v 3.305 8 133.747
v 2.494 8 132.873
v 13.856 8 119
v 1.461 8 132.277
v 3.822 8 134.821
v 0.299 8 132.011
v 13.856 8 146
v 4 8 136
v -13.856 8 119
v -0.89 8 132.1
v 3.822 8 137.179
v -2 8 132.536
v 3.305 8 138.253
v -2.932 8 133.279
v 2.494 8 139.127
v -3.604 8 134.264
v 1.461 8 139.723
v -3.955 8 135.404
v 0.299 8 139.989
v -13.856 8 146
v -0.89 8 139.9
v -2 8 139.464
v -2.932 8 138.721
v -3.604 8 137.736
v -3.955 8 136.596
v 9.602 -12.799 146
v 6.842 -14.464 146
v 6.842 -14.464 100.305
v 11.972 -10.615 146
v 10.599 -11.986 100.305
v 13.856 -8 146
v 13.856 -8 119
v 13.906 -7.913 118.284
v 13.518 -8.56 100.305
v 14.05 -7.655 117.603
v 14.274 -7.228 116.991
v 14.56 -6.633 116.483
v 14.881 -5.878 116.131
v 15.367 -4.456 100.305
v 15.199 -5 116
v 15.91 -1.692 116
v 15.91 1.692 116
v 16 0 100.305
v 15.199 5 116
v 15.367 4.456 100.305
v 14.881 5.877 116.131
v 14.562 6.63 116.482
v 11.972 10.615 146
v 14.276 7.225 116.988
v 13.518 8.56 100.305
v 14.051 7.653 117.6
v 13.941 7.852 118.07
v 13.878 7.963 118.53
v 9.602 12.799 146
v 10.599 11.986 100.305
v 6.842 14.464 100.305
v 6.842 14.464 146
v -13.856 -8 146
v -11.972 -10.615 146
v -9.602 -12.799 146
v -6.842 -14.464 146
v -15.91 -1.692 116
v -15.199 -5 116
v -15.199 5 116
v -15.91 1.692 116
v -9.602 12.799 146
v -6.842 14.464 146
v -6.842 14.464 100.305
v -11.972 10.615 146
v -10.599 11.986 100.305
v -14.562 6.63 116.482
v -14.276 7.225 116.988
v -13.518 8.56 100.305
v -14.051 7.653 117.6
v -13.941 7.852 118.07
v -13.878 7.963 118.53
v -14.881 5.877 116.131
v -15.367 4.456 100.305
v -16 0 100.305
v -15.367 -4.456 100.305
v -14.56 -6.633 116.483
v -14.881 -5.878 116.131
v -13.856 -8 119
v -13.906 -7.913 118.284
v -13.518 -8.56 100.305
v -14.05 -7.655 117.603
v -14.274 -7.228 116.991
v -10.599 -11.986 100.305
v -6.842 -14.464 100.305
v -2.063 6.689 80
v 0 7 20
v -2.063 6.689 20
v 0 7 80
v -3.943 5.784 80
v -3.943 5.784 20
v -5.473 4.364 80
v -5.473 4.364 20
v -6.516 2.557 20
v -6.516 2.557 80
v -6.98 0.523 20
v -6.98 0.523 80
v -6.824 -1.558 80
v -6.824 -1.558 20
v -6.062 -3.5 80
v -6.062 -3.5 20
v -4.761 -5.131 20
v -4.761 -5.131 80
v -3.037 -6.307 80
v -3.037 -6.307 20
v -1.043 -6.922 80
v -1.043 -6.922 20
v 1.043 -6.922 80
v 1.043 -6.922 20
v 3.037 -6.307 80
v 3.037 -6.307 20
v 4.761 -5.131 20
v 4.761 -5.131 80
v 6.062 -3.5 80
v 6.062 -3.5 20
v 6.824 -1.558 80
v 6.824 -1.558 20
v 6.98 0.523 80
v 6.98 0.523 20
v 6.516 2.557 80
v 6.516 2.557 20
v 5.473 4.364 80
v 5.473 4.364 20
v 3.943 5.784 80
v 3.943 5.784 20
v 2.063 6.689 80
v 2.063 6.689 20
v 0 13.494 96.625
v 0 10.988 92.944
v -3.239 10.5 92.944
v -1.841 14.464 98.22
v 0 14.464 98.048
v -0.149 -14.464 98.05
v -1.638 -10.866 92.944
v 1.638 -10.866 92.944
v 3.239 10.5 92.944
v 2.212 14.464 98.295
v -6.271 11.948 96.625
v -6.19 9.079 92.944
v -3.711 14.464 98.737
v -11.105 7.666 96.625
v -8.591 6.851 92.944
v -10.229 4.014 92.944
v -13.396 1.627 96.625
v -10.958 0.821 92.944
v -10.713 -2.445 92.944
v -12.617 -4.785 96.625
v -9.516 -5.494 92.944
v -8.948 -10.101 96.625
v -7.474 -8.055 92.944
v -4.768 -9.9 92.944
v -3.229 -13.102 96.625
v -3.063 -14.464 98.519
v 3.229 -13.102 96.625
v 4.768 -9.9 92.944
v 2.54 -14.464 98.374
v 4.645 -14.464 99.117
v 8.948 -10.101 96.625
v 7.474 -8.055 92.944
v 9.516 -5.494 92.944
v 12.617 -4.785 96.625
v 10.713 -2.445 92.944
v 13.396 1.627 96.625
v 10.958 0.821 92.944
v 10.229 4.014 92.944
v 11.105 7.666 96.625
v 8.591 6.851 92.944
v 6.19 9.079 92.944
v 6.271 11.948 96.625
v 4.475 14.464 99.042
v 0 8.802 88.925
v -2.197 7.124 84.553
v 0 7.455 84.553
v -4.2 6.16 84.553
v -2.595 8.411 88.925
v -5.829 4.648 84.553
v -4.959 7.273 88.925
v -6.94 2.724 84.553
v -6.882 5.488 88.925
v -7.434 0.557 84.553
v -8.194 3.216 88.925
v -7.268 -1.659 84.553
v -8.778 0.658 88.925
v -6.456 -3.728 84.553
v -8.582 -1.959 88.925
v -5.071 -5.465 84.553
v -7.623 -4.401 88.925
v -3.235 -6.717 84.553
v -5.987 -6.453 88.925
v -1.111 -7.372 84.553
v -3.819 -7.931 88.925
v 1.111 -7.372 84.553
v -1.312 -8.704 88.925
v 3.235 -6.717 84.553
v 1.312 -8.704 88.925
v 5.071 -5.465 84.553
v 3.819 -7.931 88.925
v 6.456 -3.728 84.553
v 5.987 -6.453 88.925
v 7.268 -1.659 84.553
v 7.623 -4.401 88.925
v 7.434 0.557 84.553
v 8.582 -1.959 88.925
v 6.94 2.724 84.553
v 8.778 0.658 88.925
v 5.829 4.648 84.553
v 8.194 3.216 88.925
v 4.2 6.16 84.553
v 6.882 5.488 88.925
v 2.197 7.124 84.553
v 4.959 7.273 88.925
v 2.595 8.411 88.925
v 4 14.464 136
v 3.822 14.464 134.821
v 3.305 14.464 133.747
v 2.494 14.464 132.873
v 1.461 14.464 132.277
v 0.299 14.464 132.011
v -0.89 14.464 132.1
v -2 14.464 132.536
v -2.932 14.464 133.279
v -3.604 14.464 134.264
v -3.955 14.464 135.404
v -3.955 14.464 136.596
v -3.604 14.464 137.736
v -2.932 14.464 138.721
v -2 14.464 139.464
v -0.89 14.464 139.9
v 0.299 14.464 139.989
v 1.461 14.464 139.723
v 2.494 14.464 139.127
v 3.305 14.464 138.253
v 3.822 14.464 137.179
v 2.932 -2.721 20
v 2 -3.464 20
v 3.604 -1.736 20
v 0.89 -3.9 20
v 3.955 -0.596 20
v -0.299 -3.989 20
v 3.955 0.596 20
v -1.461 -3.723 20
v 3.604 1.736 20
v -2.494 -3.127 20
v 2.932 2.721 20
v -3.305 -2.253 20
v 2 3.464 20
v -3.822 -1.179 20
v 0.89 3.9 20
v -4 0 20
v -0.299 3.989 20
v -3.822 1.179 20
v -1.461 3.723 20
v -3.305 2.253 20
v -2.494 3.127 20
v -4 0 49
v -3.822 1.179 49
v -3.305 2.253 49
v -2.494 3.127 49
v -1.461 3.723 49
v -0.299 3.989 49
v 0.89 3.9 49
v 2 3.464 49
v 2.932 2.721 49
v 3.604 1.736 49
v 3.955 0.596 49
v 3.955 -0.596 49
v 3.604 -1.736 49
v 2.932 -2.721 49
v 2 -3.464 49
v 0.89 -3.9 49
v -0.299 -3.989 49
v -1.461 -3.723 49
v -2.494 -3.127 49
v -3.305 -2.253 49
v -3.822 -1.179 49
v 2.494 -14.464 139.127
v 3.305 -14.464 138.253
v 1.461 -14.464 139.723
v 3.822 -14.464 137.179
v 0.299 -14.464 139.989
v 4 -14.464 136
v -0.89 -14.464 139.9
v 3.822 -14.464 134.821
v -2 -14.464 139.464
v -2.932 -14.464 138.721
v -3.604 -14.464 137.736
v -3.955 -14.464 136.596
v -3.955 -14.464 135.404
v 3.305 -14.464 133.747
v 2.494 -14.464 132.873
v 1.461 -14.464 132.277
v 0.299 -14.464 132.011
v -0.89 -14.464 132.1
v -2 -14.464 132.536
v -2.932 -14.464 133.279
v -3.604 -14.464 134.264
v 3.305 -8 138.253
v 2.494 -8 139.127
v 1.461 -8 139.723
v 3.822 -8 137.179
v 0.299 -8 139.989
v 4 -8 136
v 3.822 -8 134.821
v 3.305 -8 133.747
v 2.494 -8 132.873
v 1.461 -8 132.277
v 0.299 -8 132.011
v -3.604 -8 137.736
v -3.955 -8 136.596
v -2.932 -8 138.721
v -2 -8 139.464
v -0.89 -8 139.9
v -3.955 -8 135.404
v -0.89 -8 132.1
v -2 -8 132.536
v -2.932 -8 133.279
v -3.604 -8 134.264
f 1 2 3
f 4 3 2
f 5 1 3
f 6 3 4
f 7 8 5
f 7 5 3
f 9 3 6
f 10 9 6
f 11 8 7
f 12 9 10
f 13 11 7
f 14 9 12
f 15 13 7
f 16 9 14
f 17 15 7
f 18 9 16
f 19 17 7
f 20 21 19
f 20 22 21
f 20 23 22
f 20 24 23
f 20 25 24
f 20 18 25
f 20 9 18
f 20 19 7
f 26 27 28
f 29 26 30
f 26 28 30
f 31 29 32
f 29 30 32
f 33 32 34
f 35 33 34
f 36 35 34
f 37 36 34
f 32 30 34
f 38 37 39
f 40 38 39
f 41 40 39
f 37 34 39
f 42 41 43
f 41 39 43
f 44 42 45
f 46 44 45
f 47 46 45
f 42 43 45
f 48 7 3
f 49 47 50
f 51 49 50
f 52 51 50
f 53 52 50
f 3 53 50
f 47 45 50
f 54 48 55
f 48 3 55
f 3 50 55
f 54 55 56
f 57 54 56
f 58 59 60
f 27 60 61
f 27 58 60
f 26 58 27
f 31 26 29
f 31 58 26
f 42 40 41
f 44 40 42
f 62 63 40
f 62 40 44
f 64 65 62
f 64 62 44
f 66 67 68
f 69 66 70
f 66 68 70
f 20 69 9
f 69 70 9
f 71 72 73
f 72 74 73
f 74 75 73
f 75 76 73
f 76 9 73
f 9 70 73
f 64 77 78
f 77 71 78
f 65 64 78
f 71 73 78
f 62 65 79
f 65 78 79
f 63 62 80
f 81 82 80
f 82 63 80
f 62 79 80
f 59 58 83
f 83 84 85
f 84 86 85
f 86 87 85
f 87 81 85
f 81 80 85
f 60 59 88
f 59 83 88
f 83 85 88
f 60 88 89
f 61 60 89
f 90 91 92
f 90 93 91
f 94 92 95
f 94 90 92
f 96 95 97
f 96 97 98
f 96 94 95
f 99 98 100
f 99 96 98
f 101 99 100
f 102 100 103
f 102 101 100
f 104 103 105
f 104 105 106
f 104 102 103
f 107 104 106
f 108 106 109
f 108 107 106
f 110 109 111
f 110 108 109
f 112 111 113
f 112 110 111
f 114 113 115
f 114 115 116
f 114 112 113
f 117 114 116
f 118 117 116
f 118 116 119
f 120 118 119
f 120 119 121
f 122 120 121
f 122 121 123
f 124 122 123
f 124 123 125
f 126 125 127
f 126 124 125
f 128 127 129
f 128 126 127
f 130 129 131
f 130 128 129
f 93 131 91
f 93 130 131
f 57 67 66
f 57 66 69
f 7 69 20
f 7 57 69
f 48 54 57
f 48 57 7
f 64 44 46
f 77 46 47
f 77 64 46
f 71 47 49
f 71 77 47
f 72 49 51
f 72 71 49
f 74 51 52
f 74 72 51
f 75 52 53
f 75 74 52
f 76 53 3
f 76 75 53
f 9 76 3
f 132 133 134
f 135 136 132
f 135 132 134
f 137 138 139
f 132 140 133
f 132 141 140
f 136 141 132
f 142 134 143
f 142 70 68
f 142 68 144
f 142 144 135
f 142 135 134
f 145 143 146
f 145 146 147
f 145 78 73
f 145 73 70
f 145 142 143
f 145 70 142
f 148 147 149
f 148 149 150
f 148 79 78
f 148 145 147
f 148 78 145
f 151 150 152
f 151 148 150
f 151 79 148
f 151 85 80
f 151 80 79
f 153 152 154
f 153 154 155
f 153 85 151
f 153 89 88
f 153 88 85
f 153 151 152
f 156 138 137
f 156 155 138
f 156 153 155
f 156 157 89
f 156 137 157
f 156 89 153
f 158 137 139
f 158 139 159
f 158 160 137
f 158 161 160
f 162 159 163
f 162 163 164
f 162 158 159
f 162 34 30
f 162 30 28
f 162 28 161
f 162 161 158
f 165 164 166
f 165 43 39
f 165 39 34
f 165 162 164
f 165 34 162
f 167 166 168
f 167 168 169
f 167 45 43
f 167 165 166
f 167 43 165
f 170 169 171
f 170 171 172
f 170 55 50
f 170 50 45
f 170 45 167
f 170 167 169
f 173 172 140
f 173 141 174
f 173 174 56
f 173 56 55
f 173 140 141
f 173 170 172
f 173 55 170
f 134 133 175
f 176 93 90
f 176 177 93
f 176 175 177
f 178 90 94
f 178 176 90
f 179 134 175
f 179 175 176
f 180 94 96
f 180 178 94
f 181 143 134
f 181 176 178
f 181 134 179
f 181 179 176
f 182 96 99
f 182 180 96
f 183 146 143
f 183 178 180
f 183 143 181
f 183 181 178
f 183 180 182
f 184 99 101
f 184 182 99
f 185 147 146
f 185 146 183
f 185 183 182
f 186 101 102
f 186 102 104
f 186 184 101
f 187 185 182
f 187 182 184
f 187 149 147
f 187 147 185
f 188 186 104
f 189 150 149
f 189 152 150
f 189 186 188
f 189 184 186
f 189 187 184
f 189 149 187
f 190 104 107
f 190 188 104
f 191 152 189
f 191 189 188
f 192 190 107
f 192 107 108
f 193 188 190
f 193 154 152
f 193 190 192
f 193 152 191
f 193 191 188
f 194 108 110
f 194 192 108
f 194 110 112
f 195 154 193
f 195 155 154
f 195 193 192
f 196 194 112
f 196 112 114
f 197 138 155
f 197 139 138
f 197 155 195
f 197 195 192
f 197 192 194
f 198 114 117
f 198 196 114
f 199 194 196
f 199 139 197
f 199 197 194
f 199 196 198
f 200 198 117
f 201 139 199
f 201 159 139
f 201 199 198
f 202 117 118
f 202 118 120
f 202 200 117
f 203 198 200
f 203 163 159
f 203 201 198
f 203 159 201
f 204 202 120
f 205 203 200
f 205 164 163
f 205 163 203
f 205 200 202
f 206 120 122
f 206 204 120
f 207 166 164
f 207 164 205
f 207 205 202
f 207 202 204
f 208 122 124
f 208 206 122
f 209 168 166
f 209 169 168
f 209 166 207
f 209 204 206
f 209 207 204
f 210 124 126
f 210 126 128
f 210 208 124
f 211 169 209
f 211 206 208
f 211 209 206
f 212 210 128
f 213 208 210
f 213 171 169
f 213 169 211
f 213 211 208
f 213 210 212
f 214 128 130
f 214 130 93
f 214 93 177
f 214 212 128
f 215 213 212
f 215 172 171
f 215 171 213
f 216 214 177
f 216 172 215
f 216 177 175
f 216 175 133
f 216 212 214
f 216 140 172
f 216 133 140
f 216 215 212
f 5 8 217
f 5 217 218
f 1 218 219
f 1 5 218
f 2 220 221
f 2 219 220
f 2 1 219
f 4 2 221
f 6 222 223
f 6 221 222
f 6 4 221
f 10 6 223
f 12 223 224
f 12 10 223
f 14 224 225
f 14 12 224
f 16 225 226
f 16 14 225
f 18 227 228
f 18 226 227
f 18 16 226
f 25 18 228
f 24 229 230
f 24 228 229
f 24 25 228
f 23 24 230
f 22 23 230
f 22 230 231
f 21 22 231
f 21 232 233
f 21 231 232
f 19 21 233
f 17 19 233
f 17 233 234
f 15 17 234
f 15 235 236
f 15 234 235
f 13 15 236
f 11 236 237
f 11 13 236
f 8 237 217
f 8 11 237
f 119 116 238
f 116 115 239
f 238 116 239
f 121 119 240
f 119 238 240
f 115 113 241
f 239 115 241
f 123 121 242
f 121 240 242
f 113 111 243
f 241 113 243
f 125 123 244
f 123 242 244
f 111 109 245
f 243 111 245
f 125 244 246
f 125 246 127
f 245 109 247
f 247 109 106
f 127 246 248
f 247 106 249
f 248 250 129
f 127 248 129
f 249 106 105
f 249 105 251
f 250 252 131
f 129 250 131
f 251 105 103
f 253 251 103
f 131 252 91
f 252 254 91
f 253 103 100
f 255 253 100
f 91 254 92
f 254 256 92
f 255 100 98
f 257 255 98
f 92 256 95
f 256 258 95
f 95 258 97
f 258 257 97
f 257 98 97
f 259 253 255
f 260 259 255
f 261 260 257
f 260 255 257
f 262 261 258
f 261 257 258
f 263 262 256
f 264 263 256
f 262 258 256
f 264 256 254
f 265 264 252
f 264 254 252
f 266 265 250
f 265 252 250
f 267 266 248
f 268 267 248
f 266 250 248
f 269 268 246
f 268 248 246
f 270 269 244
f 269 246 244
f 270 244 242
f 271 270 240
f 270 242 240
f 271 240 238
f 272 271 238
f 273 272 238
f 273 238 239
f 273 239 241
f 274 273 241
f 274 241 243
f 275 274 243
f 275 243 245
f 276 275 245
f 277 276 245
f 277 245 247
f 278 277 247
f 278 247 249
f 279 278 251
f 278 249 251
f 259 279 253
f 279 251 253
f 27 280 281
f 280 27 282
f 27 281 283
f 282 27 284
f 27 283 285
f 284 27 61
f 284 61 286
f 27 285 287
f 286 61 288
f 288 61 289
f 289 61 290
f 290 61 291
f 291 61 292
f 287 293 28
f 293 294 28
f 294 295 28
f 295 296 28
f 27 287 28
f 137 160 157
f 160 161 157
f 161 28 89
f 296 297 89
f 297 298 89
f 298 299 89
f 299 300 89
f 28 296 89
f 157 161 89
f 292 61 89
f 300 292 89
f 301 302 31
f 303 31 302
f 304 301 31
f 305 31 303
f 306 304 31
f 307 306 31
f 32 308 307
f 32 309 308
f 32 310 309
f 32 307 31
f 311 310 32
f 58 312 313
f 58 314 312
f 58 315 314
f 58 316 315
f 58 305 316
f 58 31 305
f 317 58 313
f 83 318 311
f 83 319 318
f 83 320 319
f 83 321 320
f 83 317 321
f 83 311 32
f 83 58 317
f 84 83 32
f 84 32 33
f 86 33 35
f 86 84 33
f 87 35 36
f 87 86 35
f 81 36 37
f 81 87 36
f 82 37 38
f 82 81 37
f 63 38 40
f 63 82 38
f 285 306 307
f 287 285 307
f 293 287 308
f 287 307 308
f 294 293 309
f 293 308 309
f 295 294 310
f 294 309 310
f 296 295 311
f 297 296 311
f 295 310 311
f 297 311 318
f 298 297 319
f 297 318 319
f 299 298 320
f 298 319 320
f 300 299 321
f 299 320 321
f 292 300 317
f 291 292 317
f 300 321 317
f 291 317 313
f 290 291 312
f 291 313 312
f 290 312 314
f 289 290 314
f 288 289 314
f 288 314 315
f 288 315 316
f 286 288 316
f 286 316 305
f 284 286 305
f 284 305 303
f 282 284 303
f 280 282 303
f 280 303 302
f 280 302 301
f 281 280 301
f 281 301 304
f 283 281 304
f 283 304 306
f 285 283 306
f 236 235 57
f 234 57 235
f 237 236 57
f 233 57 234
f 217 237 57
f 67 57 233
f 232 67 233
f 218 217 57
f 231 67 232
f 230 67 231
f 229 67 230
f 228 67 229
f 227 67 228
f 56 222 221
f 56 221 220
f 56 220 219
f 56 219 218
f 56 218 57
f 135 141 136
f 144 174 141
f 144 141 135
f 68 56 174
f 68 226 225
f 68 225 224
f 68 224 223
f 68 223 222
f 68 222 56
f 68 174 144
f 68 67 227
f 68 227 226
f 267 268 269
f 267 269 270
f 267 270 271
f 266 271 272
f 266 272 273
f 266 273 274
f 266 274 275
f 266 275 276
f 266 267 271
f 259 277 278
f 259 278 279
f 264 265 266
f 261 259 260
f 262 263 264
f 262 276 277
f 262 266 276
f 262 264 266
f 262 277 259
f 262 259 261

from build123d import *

# Parameters (mm, degrees)
SKETCH1_R               = 16
BOSS_EXTRUDE1_DEPTH     = 146
SKETCH2_W               = 150.836885197
SKETCH2_H               = 19.135619971
CUT_EXTRUDE2_DEPTH      = 17
CUT_EXTRUDE2_DEPTH_BACK = 17
SKETCH3_R               = 4
CUT_EXTRUDE3_DEPTH      = 15.463502114
CUT_EXTRUDE3_DEPTH_BACK = 15.463502114
SKETCH5_W               = 20
SKETCH5_H               = 24.196648242
CUT_EXTRUDE4_DEPTH      = 17.0000001
CUT_EXTRUDE4_DEPTH_BACK = 17.0000001
SKETCH6_R               = 4
CUT_EXTRUDE5_DEPTH      = 29


with BuildPart() as part:
    # Sketch1 → Boss-Extrude1 (new body)
    with BuildSketch(Plane.XY):
        Circle(SKETCH1_R)
    extrude(amount=BOSS_EXTRUDE1_DEPTH)

    # Sketch2 → Cut-Extrude2 (cut, two sides)
    with BuildSketch(Plane(origin=(0, 0, 0), x_dir=(0, 0, -1), z_dir=(1, 0, 0))) as cut_extrude2_sk:
        with BuildLine():
            Line((-116, -5), (-116, 5))
            ThreePointArc((-116, 5), (-116.878679656, 7.121320344), (-119, 8))
            Line((-119, 8), (-146, 8))
            Line((-146, 8), (-146, -8))
            Line((-146, -8), (-119, -8))
            ThreePointArc((-119, -8), (-116.878679656, -7.121320344), (-116, -5))
        make_face()
        with Locations((-70.581557402, -24.031312)):
            Rectangle(SKETCH2_W, SKETCH2_H)
        with Locations((-70.581557402, 24.031312)):
            Rectangle(SKETCH2_W, SKETCH2_H)
    extrude(amount=CUT_EXTRUDE2_DEPTH, mode=Mode.SUBTRACT)
    extrude(cut_extrude2_sk.sketch, amount=-CUT_EXTRUDE2_DEPTH_BACK, mode=Mode.SUBTRACT)

    # Sketch3 → Cut-Extrude3 (cut, two sides)
    with BuildSketch(Plane(origin=(0, 0, 0), x_dir=(1, 0, 0), z_dir=(0, 1, 0))) as cut_extrude3_sk:
        with Locations((0, -136)):
            Circle(SKETCH3_R)
    extrude(amount=CUT_EXTRUDE3_DEPTH, mode=Mode.SUBTRACT)
    extrude(cut_extrude3_sk.sketch, amount=-CUT_EXTRUDE3_DEPTH_BACK, mode=Mode.SUBTRACT)

    # Sketch4 → Cut-Revolve3 (revolve, cut)
    with BuildSketch(Plane(origin=(0, 0, 0), x_dir=(0, 0, -1), z_dir=(1, 0, 0))):
        with BuildLine():
            Line((0, 7), (-80, 7))
            ThreePointArc((-80, 7), (-86.772424654, 8.019684618), (-92.944350416, 10.988324842))
            Line((-92.944350416, 10.988324842), (-118.219798108, 28.197447612))
            Line((-118.219798108, 28.197447612), (0, 28.197447612))
            Line((0, 28.197447612), (0, 7))
        make_face()
    revolve(axis=Axis((0, 0, 0), (0, 0, 1)), mode=Mode.SUBTRACT)

    # Sketch5 → Cut-Extrude4 (cut, two sides)
    with BuildSketch(Plane(origin=(0, 0, 0), x_dir=(0, 0, -1), z_dir=(1, 0, 0))) as cut_extrude4_sk:
        with Locations((-10, 0)):
            Rectangle(SKETCH5_W, SKETCH5_H)
    extrude(amount=CUT_EXTRUDE4_DEPTH, mode=Mode.SUBTRACT)
    extrude(cut_extrude4_sk.sketch, amount=-CUT_EXTRUDE4_DEPTH_BACK, mode=Mode.SUBTRACT)

    # Sketch6 → Cut-Extrude5 (cut)
    with BuildSketch(Plane(origin=(0, 0, 20), x_dir=(-1, 0, 0), z_dir=(0, 0, -1))):
        Circle(SKETCH6_R)
    extrude(amount=-CUT_EXTRUDE5_DEPTH, mode=Mode.SUBTRACT)


solid = part.part
